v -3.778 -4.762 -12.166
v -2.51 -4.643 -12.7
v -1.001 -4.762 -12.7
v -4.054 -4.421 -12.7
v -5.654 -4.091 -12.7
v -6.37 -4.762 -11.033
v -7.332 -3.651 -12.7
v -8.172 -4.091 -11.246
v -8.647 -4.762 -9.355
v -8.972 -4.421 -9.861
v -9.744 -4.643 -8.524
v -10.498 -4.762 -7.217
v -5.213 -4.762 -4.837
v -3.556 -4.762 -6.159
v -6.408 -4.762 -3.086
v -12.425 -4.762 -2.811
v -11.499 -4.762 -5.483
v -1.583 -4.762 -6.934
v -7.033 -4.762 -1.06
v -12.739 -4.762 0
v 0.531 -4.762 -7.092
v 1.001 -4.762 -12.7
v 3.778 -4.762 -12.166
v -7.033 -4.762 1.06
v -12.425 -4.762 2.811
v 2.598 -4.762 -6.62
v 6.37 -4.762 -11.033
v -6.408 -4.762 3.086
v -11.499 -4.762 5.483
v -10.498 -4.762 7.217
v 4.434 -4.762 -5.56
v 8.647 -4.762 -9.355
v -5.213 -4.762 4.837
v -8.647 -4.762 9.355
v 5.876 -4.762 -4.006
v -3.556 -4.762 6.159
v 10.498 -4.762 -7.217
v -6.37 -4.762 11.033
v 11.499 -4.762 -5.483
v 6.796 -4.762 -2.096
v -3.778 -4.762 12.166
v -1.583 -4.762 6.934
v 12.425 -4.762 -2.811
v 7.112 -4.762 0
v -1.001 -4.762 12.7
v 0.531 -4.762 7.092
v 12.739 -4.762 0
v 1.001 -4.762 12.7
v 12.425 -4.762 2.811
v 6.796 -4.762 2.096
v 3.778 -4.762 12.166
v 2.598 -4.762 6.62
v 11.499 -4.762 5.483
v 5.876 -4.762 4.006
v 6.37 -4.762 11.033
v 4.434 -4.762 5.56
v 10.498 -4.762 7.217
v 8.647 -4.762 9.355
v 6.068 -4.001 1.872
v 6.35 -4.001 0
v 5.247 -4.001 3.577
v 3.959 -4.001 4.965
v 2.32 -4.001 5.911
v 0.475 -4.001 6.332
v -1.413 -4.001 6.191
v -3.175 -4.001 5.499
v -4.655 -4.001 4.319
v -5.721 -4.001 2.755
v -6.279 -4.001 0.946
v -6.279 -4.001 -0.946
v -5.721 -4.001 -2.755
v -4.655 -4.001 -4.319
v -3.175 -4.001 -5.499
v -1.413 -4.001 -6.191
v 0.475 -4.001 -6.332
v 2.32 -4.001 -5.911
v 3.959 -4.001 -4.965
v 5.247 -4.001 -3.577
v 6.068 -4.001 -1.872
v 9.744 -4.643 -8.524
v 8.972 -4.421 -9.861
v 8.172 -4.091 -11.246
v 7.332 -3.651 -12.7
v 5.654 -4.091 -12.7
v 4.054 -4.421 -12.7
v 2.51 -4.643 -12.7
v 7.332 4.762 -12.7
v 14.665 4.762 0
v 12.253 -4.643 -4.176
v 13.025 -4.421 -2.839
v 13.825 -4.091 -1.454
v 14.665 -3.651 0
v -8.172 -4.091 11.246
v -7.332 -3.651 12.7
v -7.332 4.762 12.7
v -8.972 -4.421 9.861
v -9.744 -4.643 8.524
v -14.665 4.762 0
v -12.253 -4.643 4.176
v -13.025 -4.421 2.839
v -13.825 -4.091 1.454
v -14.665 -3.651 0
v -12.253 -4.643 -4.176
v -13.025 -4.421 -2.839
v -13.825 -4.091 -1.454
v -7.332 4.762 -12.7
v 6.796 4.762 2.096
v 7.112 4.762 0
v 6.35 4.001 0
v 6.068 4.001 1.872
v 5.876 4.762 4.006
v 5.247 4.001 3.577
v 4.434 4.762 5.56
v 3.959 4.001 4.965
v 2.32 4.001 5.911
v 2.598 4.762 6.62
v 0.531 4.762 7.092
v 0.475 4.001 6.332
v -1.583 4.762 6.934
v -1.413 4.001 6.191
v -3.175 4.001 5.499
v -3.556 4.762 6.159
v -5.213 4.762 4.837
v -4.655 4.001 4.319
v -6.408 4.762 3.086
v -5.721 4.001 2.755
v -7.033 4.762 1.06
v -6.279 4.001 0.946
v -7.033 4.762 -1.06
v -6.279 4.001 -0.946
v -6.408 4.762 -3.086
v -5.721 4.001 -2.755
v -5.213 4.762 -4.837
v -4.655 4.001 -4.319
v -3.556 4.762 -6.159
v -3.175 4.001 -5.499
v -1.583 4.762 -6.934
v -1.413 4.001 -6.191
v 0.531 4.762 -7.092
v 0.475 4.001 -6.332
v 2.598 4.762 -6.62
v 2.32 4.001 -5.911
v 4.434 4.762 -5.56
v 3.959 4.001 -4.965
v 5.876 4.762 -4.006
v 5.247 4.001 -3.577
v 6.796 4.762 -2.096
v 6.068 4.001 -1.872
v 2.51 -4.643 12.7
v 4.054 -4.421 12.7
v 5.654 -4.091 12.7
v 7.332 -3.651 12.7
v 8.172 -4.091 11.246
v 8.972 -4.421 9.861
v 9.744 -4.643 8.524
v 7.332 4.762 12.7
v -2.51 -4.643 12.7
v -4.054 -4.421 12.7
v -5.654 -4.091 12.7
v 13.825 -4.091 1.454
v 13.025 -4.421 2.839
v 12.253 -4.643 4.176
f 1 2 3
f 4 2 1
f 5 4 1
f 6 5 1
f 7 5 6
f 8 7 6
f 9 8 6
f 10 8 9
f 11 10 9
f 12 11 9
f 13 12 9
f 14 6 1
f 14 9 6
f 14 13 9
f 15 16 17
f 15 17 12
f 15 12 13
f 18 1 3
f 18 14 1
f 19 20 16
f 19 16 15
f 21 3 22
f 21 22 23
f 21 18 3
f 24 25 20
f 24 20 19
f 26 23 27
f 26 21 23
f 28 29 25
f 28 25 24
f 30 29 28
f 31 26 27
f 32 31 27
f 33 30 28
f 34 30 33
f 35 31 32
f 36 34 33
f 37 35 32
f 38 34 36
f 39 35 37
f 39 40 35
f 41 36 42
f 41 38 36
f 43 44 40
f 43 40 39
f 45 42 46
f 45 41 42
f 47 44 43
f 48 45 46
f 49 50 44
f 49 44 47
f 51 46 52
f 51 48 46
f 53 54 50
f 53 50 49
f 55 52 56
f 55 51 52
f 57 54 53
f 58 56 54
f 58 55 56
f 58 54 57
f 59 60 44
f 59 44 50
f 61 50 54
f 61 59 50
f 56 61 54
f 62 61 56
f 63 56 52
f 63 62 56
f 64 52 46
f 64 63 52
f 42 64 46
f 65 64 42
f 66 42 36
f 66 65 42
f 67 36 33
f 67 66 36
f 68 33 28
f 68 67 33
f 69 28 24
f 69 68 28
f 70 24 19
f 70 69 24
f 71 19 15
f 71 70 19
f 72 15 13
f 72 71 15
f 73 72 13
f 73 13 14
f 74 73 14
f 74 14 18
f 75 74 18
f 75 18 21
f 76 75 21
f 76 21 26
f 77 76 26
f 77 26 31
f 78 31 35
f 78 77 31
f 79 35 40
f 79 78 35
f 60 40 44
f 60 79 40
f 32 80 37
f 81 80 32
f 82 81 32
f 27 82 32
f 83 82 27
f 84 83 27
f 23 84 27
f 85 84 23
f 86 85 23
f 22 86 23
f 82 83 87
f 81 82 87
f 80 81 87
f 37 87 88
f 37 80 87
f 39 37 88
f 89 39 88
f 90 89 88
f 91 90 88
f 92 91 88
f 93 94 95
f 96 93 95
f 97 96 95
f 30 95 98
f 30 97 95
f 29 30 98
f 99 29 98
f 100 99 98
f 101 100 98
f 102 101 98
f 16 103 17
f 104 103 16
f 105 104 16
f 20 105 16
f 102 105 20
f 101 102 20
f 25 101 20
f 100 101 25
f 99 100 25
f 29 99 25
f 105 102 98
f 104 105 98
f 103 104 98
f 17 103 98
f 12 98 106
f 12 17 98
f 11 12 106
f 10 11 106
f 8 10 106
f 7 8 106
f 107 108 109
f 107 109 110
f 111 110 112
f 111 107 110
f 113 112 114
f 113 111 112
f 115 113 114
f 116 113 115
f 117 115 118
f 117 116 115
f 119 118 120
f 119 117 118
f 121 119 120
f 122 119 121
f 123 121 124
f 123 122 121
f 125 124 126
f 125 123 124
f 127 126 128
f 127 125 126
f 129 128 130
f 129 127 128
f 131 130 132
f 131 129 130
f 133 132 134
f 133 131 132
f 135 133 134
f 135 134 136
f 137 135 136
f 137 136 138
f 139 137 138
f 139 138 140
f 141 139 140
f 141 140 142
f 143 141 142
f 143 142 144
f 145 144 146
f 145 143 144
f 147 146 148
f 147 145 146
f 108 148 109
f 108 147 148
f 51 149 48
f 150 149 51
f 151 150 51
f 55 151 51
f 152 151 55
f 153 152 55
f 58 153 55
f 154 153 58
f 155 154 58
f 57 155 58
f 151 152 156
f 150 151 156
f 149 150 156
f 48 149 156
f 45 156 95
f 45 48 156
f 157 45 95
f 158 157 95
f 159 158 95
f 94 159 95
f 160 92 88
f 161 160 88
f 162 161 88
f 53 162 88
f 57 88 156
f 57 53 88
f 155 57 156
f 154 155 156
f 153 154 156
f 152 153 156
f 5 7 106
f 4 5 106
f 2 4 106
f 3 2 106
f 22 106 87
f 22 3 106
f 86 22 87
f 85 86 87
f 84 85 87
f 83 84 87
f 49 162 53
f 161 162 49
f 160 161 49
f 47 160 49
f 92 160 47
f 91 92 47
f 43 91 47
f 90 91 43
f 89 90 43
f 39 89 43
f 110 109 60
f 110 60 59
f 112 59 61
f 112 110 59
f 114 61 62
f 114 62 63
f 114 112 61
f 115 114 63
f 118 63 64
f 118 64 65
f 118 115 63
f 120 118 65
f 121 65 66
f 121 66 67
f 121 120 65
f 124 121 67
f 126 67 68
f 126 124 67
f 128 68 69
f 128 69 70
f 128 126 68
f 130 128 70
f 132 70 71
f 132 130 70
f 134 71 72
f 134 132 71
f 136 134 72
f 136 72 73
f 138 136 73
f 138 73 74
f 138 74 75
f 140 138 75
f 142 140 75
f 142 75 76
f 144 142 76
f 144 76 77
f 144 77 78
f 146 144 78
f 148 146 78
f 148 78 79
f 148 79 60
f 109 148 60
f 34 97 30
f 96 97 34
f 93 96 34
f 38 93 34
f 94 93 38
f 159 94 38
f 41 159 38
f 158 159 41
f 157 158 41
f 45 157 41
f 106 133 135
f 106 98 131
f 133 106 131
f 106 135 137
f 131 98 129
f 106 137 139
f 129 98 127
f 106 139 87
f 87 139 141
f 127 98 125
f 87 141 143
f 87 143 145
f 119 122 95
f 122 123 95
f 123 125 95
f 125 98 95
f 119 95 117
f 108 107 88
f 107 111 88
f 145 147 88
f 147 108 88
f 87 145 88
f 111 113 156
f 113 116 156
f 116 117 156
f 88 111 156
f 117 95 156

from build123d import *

# Parameters (mm, degrees)
F0_R     = 6.35
F1_DEPTH = 4.7625
F2_SIZE  = 0.762


# Not quite as in the source:
# - a feature names something its author has since deleted; it is built from what else it names


with BuildPart() as f1:
    # F0 (on Front) → F1 (new body, symmetric)
    with BuildSketch(Plane.XZ):
        Polygon((7.3323484187, 12.7), (-7.3323484187, 12.7), (-14.6646968374, 0), (-7.3323484187, -12.7), (7.3323484187, -12.7), (14.6646968374, 0), align=None)
        Circle(F0_R, mode=Mode.SUBTRACT)
    extrude(amount=F1_DEPTH, both=True)

    # F2
    f2_edges = [f1.edges().sort_by_distance(p)[0] for p in [
        (-6.35, -4.7625, 0),
        (-6.35, 4.7625, 0),
    ]]
    chamfer(f2_edges, length=F2_SIZE)

    # F4: sweep along a path in F4_path
    with BuildLine(Plane(origin=(7.112, -4.7625, 0), x_dir=(0, 0, -1), z_dir=(0, 1, 0))) as f4_path:
        CenterArc((0, 7.112), 7.112, 0, 360)
    # F3 (on Top) → F4 (sweep, cut)
    with BuildSketch(Plane.XY):
        Polygon((-14.8424788945, -5.049383917), (-12.7, -4.7852232567), (-14.8424788945, -3.5482624902), align=None)
    sweep(path=f4_path.line, mode=Mode.SUBTRACT)


solid = f1.part
